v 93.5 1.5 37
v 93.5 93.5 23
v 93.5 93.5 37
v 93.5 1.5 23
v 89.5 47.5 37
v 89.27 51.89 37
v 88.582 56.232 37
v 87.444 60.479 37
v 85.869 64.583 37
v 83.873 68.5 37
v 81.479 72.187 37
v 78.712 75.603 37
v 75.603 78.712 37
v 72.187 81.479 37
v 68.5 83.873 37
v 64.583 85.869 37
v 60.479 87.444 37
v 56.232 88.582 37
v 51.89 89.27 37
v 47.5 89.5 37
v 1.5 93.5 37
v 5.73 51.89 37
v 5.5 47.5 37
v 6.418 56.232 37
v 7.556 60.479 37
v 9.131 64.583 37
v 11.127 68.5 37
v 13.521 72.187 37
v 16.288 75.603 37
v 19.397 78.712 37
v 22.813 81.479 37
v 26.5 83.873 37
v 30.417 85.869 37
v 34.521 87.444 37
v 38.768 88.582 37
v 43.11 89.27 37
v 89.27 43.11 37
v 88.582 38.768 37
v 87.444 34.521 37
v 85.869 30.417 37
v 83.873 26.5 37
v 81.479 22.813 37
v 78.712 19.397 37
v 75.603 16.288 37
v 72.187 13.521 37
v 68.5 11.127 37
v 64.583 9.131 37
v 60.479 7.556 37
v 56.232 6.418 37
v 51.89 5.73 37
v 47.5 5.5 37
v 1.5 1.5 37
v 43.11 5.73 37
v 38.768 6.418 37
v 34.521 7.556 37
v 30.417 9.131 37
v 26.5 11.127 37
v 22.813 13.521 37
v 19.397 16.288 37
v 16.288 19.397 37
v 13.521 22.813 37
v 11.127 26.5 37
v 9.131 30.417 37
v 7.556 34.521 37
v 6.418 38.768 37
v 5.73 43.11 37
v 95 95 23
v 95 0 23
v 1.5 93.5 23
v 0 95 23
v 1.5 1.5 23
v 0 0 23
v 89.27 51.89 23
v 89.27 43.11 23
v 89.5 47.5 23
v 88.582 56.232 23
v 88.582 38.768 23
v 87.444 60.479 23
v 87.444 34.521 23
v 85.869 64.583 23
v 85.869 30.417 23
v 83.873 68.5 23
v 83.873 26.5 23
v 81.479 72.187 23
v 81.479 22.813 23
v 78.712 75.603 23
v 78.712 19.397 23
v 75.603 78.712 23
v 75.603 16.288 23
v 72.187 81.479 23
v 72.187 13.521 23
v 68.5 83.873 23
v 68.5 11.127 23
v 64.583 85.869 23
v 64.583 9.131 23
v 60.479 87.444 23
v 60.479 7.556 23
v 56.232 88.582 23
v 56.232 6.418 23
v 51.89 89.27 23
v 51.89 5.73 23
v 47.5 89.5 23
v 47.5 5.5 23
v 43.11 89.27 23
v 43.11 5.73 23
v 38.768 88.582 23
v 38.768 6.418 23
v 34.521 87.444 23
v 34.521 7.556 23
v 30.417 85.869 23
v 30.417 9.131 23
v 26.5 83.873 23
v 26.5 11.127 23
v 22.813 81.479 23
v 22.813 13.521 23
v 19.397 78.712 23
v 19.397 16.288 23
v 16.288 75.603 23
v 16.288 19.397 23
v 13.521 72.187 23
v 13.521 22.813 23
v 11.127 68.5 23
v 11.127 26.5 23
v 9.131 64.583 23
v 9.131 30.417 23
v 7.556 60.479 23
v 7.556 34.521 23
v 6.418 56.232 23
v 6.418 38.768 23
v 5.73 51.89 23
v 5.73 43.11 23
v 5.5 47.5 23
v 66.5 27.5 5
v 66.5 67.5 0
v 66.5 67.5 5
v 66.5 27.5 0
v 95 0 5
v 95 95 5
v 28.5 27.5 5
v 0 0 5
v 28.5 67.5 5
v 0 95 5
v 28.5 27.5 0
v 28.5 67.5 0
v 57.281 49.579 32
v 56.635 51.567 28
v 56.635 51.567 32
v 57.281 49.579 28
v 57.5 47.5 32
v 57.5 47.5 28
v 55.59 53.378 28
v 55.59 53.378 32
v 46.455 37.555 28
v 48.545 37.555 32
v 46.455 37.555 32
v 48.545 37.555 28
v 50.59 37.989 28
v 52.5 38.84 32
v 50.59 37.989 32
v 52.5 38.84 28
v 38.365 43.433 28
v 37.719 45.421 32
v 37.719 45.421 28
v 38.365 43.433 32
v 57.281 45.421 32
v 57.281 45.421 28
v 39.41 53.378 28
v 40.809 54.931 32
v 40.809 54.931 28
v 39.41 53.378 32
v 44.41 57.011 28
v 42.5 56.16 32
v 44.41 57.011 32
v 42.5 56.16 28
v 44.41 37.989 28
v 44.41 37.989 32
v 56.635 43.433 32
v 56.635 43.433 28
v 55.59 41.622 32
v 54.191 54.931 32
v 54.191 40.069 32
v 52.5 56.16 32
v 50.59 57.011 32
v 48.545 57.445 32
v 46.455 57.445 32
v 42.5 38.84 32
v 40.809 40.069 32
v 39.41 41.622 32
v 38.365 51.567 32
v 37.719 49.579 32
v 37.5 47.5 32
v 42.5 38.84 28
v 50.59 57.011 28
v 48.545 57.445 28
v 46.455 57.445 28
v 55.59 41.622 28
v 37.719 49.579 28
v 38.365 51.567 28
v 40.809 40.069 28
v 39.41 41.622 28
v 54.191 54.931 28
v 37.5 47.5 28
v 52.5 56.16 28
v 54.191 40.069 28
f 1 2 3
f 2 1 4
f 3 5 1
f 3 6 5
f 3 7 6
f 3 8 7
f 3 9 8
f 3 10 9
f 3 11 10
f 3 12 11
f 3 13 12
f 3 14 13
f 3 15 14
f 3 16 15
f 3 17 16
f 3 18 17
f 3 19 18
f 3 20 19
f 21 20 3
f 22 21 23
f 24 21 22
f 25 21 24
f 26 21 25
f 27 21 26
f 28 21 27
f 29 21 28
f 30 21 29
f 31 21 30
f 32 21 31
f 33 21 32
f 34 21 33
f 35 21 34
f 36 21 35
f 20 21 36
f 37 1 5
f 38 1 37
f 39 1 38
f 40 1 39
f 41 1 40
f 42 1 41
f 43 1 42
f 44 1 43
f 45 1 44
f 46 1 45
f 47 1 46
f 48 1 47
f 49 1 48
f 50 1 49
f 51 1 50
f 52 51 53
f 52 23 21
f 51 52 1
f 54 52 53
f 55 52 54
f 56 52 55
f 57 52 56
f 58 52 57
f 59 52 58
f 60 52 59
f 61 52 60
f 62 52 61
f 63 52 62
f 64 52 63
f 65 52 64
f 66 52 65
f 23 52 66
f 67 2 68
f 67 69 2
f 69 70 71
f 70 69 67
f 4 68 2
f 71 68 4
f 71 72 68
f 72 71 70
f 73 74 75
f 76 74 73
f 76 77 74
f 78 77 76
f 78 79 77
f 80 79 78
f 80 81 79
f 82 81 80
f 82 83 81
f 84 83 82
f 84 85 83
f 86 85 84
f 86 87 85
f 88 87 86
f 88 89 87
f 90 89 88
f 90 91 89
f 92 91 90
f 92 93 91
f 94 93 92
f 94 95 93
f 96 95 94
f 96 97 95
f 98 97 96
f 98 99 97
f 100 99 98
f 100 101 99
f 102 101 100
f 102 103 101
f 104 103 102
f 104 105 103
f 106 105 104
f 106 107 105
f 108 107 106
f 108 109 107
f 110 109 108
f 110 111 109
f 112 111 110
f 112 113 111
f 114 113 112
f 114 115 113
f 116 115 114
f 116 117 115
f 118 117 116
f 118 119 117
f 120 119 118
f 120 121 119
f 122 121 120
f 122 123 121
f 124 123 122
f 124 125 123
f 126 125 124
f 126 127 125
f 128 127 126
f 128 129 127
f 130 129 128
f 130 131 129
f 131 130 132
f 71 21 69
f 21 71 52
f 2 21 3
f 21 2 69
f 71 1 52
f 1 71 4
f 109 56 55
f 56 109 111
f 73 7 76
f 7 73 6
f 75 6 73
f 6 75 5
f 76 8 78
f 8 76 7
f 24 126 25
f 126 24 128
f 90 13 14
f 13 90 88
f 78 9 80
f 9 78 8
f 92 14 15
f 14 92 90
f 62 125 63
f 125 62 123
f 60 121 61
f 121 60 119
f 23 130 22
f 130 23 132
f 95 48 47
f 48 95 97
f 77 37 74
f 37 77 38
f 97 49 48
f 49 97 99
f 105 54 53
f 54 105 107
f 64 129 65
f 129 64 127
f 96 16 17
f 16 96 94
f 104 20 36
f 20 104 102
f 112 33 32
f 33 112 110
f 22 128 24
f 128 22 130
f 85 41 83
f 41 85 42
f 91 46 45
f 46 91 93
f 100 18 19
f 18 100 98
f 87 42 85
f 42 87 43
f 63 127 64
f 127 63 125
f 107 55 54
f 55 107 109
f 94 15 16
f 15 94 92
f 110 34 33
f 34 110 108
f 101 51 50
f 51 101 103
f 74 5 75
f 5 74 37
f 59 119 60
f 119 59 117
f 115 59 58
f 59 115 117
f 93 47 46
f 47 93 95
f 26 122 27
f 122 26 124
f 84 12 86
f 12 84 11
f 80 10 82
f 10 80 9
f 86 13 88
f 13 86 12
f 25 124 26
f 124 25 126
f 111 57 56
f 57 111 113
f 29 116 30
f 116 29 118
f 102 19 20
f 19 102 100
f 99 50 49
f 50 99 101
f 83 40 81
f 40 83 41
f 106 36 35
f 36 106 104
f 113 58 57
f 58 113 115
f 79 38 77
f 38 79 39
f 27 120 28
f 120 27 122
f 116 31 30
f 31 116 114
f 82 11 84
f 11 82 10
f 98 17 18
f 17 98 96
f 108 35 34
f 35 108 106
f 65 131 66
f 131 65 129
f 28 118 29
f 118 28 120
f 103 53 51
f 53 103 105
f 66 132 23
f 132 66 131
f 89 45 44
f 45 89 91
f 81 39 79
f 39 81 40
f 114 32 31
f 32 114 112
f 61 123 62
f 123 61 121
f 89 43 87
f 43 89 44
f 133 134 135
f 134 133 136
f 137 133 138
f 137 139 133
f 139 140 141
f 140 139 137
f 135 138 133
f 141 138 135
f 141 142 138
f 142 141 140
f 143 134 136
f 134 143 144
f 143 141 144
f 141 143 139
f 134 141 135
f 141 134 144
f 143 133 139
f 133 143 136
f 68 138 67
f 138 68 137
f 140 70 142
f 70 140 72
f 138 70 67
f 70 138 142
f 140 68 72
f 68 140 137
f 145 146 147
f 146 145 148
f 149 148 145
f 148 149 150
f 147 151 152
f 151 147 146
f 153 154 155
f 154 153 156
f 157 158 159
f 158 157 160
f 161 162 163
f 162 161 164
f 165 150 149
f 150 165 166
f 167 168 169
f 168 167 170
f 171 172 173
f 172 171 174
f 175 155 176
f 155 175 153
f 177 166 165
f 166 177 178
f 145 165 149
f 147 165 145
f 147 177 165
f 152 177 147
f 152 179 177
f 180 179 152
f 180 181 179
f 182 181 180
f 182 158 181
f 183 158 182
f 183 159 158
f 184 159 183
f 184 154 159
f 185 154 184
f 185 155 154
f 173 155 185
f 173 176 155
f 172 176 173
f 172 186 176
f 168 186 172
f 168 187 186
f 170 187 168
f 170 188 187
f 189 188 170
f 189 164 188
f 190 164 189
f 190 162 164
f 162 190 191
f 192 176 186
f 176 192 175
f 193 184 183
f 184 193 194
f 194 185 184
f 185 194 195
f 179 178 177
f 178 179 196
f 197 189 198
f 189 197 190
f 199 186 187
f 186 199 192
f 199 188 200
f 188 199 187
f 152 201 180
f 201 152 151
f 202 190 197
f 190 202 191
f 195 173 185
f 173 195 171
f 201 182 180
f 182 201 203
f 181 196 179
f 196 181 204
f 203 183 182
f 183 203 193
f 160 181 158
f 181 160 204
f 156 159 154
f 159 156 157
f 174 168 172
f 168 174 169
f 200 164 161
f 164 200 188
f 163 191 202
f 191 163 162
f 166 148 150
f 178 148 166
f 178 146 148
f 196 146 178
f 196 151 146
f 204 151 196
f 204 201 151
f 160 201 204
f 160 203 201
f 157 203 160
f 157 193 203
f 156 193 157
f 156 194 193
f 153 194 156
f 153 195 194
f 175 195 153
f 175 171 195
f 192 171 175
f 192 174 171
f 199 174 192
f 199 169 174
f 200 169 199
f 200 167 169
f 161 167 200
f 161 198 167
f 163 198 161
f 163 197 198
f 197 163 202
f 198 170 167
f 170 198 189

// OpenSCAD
// Noctua NH-L9 Low-Profile CPU Cooler
// Total height: 37mm (vs 70mm for NH-L12S)
// Footprint: 95mm x 95mm
// Fan: 92mm x 14mm
// Ideal for ultra-compact builds with Pico PSU

module noctua_nh_l9() {
    // Overall dimensions
    cooler_width = 95;
    cooler_depth = 95;
    cooler_total_height = 37;

    // Component heights (simplified model)
    base_height = 5;        // CPU contact plate
    heatsink_height = 18;   // Aluminum fins
    fan_height = 14;        // 92mm x 14mm fan
    // Total: 5 + 18 + 14 = 37mm

    // Fan dimensions
    fan_size = 92;
    fan_x = (cooler_width - fan_size) / 2;
    fan_y = (cooler_depth - fan_size) / 2;

    union() {
        // CPU base plate (copper/nickel plated)
        color([0.72, 0.45, 0.20]) {  // Copper color
            translate([cooler_width/2 - 19, cooler_depth/2 - 20, 0]) {
                cube([38, 40, base_height]);
            }
        }

        // Heatsink fins (aluminum)
        color([0.75, 0.75, 0.75]) {  // Aluminum
            translate([0, 0, base_height]) {
                cube([cooler_width, cooler_depth, heatsink_height]);
            }
        }

        // 92mm Fan (brown/beige Noctua colors)
        color([0.59, 0.29, 0.0]) {  // Brown frame
            translate([fan_x, fan_y, base_height + heatsink_height]) {
                difference() {
                    cube([fan_size, fan_size, fan_height]);

                    // Fan blade cutout (circular)
                    translate([fan_size/2, fan_size/2, -0.1]) {
                        cylinder(h = fan_height + 0.2, d = fan_size - 8, $fn = 60);
                    }
                }
            }
        }

        // Fan hub (center)
        color([0.82, 0.71, 0.55]) {  // Beige
            translate([cooler_width/2, cooler_depth/2, base_height + heatsink_height + fan_height/2 - 2]) {
                cylinder(h = 4, d = 20, $fn = 30);
            }
        }
    }
}

// Preview
noctua_nh_l9();
